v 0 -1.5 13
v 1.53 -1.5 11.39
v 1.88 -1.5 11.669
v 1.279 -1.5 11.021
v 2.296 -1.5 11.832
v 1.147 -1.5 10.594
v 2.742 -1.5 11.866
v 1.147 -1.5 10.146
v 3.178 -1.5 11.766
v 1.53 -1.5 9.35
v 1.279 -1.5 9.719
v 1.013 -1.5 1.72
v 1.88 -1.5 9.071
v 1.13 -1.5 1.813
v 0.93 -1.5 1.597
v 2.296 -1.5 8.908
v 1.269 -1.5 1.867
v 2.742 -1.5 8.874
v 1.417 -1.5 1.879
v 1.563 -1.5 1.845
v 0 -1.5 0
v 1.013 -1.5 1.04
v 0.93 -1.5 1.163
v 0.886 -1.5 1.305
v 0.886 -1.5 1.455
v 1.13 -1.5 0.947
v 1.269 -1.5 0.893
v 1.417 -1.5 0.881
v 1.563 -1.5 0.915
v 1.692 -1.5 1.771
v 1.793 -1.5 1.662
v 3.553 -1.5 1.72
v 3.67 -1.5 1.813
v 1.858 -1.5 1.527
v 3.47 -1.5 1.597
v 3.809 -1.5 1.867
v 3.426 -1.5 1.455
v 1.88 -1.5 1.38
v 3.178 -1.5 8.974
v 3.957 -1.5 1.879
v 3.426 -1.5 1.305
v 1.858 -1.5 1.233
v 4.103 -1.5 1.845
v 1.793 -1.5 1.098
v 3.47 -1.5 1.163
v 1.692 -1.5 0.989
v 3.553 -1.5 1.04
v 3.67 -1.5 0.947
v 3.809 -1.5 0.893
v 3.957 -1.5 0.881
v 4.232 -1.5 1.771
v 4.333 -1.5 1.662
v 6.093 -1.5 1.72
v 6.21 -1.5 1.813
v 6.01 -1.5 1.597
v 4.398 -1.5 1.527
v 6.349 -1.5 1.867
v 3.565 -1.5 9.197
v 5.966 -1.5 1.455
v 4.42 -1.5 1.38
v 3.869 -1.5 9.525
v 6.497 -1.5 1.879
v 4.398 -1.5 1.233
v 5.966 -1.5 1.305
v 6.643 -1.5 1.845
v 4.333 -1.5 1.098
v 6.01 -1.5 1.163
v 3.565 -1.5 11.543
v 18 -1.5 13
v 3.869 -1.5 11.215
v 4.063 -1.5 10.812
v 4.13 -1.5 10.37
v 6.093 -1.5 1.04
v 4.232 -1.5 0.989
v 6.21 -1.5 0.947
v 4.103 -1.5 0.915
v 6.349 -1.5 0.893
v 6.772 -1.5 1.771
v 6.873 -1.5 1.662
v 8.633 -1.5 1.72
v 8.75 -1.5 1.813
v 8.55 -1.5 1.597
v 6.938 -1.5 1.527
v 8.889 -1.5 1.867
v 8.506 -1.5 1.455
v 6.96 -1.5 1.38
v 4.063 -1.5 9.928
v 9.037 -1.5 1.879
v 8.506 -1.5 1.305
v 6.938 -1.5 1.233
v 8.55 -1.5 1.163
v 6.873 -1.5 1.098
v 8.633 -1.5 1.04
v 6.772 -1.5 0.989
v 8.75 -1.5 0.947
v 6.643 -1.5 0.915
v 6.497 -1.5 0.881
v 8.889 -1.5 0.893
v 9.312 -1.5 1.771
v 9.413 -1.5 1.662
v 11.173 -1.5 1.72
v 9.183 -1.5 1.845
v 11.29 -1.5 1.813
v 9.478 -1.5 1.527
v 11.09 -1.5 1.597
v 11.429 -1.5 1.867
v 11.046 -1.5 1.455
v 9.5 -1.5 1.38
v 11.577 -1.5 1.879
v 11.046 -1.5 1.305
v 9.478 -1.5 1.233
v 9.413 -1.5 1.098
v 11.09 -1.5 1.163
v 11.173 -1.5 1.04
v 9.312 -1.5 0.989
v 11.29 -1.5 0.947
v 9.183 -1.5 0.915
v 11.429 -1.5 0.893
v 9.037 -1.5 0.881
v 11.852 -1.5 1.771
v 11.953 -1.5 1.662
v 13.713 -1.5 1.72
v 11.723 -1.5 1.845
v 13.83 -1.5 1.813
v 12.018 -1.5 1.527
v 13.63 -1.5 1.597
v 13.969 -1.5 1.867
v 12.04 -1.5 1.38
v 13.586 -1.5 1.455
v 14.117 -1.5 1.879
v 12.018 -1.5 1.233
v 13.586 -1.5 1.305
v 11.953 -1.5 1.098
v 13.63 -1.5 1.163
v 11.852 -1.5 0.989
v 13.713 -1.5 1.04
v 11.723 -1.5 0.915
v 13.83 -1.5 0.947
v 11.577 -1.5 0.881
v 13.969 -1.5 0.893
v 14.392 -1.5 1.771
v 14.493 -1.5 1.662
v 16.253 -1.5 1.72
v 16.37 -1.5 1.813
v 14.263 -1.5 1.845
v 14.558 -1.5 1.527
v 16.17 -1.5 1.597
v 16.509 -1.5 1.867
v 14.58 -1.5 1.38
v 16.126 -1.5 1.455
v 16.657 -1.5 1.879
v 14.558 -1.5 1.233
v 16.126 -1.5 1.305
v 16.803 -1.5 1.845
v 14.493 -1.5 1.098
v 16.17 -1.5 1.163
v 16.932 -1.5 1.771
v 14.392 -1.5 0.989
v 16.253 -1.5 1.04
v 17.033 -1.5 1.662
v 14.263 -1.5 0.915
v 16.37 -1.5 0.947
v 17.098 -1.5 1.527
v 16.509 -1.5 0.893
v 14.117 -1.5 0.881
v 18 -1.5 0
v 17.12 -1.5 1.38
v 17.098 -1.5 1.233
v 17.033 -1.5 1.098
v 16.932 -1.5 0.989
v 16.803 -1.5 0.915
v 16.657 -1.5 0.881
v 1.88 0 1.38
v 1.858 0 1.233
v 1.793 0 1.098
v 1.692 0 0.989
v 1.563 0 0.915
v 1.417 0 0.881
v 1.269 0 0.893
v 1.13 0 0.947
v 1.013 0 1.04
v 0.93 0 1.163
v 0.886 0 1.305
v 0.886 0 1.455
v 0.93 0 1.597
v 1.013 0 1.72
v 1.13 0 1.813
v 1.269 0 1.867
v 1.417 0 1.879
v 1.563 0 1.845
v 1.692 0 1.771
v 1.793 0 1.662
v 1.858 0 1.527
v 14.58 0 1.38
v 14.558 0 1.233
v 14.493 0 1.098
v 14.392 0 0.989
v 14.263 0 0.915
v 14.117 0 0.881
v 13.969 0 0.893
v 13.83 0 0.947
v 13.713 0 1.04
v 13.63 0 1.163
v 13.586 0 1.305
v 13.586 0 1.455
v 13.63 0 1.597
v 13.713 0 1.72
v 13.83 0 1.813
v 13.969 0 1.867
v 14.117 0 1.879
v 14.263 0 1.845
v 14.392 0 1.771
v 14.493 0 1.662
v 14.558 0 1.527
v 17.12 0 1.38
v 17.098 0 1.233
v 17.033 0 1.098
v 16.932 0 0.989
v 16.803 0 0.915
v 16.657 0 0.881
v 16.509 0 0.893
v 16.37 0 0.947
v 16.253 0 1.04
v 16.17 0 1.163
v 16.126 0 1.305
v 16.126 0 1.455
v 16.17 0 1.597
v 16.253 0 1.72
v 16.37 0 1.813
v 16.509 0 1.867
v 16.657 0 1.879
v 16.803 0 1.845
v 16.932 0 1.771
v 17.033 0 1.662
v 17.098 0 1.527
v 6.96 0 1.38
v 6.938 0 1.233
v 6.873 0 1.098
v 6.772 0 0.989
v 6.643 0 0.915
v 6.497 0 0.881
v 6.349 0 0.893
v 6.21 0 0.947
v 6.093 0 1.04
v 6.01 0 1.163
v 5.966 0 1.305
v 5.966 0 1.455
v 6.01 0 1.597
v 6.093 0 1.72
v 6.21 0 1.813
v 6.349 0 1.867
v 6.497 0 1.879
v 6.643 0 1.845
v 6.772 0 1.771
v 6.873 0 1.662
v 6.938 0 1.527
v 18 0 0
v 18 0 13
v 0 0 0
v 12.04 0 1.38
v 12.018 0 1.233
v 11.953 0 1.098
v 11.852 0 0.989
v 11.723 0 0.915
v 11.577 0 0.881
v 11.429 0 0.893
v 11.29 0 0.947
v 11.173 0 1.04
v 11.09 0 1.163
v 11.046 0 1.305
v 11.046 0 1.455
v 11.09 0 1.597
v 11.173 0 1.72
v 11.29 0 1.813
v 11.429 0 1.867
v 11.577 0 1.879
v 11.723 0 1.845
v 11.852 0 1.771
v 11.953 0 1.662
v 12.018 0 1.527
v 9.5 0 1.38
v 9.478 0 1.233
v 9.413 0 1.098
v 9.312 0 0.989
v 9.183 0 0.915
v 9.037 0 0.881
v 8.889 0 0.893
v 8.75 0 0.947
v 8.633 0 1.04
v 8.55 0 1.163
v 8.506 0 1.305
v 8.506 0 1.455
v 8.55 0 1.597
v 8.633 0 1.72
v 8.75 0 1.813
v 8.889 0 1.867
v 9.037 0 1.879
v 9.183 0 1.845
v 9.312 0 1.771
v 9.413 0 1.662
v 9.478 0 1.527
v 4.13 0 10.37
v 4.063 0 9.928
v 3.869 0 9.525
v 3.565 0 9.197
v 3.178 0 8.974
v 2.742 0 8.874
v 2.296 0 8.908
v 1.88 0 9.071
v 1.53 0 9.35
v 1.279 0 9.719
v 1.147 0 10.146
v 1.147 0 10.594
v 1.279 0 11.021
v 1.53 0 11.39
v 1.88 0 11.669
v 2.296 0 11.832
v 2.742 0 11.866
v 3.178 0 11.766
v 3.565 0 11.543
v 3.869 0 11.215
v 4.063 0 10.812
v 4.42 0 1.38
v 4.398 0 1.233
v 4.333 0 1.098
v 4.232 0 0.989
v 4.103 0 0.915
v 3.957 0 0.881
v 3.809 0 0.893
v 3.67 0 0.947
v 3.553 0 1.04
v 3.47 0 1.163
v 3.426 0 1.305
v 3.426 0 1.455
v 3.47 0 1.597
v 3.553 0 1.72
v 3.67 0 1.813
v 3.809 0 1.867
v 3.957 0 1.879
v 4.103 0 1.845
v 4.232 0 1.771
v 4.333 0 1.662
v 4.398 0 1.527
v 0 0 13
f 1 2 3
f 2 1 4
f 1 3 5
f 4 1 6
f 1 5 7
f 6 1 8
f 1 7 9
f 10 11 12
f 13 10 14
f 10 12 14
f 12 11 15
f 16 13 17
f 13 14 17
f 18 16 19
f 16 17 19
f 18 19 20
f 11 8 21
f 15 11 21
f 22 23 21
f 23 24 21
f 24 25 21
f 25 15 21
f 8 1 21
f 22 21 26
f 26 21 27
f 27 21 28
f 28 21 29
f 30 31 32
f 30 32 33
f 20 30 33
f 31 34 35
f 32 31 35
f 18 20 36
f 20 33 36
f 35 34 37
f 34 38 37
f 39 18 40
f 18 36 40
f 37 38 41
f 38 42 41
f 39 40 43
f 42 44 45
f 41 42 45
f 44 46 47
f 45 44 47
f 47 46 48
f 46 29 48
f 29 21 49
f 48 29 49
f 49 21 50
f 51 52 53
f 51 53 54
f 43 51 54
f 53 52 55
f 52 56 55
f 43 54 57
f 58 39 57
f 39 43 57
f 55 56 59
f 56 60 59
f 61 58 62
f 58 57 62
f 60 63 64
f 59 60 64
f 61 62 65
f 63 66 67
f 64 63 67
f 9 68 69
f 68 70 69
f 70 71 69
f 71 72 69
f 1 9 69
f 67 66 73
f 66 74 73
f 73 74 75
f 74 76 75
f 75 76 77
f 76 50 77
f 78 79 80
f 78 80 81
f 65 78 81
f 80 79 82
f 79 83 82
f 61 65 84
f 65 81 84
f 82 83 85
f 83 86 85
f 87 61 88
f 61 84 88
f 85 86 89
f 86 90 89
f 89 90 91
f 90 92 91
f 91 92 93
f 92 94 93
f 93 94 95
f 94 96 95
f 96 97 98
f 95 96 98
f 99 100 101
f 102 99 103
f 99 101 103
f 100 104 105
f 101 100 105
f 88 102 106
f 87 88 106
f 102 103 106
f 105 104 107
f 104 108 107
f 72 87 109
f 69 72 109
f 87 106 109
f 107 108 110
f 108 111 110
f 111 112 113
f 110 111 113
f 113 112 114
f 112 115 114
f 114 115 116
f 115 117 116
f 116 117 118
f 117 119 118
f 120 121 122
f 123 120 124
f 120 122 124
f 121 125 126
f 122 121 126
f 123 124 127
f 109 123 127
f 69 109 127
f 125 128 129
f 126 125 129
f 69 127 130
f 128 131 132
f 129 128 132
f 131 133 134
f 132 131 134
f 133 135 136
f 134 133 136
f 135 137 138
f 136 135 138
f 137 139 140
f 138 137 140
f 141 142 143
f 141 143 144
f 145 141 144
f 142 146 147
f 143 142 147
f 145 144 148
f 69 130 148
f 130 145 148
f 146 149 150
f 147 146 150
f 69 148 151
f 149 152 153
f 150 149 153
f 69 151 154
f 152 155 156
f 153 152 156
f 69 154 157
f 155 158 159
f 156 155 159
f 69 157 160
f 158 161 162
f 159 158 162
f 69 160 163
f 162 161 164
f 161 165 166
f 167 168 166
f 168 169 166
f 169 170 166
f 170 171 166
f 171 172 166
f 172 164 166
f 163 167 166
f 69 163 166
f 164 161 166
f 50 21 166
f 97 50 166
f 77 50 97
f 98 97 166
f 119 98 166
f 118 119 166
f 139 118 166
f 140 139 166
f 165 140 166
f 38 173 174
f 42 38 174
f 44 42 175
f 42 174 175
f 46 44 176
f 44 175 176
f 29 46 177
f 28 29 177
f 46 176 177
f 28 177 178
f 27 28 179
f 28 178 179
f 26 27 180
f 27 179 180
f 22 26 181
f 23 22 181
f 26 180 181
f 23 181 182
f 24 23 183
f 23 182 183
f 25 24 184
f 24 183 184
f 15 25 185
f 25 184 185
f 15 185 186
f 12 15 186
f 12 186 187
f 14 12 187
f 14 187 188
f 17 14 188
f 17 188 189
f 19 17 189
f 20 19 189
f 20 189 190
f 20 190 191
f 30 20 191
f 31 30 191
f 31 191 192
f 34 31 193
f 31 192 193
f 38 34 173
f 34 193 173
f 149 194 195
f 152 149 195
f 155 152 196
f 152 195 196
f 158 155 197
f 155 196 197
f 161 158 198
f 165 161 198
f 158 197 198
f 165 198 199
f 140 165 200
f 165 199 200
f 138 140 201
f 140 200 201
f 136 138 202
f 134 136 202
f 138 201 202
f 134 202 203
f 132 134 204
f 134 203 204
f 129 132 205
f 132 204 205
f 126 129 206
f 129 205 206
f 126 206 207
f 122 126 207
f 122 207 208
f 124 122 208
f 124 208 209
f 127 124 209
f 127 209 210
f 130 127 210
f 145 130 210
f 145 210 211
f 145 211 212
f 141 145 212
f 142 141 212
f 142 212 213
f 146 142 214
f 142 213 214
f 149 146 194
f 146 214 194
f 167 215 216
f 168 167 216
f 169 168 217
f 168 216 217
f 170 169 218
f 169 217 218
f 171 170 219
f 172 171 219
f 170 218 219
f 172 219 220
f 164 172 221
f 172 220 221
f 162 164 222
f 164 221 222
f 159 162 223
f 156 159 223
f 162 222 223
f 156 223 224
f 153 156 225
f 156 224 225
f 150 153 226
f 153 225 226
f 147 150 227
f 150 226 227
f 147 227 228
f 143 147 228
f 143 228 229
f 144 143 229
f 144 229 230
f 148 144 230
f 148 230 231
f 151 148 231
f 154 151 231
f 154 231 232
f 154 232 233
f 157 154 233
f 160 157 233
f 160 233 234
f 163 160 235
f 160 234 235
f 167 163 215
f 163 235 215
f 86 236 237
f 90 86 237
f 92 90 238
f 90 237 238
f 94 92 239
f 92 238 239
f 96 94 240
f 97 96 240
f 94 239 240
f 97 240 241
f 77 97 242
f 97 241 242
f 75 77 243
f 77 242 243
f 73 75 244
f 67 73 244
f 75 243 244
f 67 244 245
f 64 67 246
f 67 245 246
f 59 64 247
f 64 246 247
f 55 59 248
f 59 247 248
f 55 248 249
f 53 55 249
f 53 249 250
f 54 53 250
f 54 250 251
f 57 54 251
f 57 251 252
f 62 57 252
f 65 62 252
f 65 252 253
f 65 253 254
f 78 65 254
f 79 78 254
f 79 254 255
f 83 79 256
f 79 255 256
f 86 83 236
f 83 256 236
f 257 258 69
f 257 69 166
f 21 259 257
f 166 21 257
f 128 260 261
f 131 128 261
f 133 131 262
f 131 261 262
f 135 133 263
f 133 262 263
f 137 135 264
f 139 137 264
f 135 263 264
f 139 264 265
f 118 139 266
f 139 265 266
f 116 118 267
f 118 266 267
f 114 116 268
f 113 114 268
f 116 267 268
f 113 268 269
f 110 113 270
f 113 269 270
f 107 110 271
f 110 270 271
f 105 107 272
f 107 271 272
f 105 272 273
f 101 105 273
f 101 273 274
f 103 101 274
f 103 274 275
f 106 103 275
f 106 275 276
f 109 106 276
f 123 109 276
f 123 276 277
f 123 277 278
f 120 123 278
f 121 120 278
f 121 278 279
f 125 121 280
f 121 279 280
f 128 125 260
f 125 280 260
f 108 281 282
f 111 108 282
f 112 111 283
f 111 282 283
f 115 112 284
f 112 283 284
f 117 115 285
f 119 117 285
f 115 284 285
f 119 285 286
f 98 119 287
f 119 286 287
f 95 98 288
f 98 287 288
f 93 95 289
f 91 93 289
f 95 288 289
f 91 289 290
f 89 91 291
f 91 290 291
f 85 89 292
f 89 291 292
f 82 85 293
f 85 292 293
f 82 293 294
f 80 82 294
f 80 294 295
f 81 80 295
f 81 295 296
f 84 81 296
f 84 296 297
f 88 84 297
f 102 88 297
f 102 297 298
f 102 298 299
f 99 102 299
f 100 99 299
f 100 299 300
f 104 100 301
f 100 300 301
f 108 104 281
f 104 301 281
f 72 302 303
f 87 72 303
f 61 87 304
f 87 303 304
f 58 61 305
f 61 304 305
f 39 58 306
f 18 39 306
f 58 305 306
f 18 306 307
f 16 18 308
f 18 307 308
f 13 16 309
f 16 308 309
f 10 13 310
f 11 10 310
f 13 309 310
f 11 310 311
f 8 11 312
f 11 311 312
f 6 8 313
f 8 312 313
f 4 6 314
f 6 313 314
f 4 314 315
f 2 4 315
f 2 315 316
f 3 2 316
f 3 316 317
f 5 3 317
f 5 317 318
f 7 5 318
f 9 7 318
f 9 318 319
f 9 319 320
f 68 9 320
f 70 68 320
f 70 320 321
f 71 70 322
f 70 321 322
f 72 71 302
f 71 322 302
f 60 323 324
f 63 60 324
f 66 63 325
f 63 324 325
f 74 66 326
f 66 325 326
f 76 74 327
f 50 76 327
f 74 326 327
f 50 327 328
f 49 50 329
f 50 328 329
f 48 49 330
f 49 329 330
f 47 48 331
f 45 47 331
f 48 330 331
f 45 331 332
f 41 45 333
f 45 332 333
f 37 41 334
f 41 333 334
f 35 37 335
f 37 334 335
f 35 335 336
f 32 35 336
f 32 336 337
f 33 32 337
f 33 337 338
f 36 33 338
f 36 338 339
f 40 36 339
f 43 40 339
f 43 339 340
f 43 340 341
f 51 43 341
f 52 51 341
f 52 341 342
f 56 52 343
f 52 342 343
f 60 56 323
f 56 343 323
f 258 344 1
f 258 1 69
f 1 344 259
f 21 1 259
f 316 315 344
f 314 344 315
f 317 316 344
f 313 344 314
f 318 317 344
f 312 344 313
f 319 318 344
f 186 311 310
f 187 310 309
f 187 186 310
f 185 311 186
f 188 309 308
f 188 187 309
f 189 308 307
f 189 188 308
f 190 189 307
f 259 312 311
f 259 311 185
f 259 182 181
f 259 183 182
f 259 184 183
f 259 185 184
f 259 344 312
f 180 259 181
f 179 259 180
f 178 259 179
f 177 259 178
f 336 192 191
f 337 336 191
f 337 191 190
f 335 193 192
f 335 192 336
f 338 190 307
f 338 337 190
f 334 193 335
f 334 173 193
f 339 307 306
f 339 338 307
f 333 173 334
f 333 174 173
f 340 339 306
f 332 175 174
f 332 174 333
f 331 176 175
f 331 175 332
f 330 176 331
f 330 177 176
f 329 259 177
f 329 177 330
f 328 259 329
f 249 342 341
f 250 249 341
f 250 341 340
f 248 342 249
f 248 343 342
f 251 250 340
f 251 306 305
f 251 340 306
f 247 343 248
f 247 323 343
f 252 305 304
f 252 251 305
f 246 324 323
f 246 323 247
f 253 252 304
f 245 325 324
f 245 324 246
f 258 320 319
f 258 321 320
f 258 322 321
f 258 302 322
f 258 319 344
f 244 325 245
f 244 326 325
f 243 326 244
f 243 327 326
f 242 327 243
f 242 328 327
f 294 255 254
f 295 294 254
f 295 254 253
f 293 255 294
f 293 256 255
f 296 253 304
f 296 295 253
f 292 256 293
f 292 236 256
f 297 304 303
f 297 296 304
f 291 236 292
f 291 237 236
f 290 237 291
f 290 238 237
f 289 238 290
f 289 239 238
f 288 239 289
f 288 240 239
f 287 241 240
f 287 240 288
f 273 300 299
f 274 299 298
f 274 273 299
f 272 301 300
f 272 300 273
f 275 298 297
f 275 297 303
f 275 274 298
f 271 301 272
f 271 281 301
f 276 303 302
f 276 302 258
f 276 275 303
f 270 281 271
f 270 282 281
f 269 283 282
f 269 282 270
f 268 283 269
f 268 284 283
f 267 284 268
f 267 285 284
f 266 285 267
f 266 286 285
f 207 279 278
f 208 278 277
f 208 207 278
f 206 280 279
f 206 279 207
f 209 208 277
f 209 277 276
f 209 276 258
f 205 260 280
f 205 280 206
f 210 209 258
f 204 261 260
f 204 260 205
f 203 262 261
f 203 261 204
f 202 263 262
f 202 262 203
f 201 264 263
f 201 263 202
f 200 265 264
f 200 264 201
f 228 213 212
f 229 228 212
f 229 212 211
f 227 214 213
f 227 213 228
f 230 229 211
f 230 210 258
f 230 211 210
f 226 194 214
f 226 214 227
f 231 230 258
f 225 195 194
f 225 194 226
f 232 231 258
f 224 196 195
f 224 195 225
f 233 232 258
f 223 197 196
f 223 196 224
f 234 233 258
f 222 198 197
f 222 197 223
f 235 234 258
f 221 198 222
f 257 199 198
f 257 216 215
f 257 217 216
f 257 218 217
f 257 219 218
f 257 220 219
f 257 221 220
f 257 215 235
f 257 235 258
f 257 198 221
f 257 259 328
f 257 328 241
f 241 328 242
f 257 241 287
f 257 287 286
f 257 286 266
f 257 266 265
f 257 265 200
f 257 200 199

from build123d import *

# Parameters (mm, degrees)
SKETCH1_W           = 18
SKETCH1_H           = 13
SKETCH1_R           = 0.5
SKETCH1_R_2         = 1.5
BOSS_EXTRUDE1_DEPTH = 1.5


with BuildPart() as part:
    # Sketch1 → Boss-Extrude1 (new body)
    with BuildSketch(Plane(origin=(0, 0, 0), x_dir=(1, 0, 0), z_dir=(0, 1, 0))):
        with Locations((9, -6.5)):
            Rectangle(SKETCH1_W, SKETCH1_H)
        with Locations((1.38, -1.38)):
            Circle(SKETCH1_R, mode=Mode.SUBTRACT)
        with Locations((3.92, -1.38)):
            Circle(SKETCH1_R, mode=Mode.SUBTRACT)
        with Locations((6.46, -1.38)):
            Circle(SKETCH1_R, mode=Mode.SUBTRACT)
        with Locations((9, -1.38)):
            Circle(SKETCH1_R, mode=Mode.SUBTRACT)
        with Locations((11.54, -1.38)):
            Circle(SKETCH1_R, mode=Mode.SUBTRACT)
        with Locations((14.08, -1.38)):
            Circle(SKETCH1_R, mode=Mode.SUBTRACT)
        with Locations((16.62, -1.38)):
            Circle(SKETCH1_R, mode=Mode.SUBTRACT)
        with Locations((2.63, -10.37)):
            Circle(SKETCH1_R_2, mode=Mode.SUBTRACT)
    extrude(amount=-BOSS_EXTRUDE1_DEPTH)


solid = part.part
